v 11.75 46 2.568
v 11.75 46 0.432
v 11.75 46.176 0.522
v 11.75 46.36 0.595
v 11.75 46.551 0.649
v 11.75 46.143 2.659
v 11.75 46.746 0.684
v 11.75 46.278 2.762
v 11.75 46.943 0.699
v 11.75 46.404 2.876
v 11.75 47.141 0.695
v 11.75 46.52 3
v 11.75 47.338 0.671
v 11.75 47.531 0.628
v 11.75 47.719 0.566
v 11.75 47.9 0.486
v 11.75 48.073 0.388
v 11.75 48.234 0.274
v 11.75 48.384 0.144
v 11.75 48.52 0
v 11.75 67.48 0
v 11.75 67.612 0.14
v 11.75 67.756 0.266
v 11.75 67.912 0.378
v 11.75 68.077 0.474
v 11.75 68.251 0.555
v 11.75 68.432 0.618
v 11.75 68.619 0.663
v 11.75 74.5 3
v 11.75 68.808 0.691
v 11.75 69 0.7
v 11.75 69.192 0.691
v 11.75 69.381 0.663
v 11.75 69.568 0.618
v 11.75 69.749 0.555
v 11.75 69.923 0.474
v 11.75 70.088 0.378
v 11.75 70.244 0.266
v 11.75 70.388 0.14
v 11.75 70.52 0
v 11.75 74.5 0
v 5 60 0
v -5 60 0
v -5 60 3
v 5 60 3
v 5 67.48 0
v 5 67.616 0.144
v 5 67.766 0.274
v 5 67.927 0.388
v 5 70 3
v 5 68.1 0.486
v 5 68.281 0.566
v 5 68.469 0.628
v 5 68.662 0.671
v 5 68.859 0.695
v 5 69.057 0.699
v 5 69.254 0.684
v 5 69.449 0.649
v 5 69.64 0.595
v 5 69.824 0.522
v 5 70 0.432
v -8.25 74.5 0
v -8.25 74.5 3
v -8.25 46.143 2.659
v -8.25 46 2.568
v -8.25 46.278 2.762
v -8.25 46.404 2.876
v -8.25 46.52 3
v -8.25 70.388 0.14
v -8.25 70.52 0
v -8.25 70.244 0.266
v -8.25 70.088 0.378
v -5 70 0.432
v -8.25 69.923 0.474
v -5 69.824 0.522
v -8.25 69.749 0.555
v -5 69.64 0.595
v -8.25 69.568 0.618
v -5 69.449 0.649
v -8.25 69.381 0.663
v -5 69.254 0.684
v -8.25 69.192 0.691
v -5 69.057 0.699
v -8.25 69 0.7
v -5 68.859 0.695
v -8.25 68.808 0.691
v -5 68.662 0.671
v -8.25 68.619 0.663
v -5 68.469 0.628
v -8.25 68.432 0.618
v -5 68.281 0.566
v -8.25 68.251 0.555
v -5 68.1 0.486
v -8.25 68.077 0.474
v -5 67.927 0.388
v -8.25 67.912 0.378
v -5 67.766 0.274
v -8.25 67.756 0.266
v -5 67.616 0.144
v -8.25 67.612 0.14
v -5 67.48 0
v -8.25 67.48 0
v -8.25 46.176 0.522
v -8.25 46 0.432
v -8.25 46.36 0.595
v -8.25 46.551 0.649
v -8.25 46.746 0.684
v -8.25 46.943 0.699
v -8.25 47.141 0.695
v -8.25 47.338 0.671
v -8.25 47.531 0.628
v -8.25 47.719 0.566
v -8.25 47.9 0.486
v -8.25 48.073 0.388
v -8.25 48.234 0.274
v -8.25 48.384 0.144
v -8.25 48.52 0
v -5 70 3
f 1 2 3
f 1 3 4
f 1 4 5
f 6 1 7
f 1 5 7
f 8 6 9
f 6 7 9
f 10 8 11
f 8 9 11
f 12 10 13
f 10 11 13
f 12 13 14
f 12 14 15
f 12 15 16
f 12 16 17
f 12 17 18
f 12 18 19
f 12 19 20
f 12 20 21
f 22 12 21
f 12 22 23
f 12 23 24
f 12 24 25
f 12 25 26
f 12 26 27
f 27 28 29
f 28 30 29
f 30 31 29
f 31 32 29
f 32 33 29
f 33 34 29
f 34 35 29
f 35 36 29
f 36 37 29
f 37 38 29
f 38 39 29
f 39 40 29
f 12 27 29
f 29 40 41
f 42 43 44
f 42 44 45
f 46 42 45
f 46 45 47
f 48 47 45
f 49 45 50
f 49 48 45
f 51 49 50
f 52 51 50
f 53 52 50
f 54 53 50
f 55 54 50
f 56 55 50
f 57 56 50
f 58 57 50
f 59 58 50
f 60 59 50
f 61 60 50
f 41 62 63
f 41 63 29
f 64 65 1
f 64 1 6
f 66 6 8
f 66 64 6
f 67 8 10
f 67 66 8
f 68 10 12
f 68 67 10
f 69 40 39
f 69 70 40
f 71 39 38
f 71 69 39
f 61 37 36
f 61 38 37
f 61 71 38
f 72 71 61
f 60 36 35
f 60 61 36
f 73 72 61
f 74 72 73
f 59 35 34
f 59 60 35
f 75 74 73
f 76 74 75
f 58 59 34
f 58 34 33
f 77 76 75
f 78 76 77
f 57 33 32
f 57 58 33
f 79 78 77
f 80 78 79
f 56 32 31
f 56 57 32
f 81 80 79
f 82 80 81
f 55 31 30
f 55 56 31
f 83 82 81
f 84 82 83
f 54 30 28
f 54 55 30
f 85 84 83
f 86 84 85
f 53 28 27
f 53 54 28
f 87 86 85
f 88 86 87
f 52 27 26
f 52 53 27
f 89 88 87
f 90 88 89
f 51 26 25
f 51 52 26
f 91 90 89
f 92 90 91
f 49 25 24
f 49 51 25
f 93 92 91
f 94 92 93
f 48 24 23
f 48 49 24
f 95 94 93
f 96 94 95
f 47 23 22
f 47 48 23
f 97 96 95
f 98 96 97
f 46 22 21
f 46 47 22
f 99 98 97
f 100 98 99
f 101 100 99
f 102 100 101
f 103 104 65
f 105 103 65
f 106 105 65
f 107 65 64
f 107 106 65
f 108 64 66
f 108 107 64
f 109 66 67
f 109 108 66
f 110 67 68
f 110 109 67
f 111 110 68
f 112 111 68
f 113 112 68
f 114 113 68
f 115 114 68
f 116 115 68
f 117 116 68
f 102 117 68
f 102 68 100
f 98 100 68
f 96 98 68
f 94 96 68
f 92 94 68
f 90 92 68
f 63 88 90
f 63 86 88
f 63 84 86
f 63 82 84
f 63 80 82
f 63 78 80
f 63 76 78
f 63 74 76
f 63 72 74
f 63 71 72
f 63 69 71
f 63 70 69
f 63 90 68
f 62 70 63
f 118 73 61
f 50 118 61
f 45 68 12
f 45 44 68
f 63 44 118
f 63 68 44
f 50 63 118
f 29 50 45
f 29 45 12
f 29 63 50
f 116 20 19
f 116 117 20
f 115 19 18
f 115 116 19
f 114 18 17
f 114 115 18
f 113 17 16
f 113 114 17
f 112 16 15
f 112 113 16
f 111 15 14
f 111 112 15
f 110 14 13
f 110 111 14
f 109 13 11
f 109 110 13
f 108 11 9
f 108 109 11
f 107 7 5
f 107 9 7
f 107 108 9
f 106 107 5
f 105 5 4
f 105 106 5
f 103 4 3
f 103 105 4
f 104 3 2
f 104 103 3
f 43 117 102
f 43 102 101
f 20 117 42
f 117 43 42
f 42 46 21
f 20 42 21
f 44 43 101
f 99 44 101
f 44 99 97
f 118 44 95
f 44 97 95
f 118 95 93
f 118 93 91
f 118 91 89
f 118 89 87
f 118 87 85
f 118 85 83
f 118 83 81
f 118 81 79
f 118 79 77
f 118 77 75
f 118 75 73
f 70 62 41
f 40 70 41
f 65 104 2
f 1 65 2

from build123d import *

# Parameters (mm, degrees)
BOX044_W          = 50
BOX044_H          = 20
BOX044_DEPTH      = 30
BOX_W             = 10
BOX_H             = 10
BOX_DEPTH         = 30
CYLINDER011_R     = 2
CYLINDER011_DEPTH = 24
CYLINDER009_R     = 2
CYLINDER009_DEPTH = 24
CYLINDER008_R     = 2
CYLINDER008_DEPTH = 24
BOX001_W          = 20
BOX001_H          = 33
BOX001_DEPTH      = 3


with BuildPart() as cube040:
    # Box044 → Box044 (new body)
    with BuildSketch(Plane(origin=(-25, -32, -1), x_dir=(1, 0, 0), z_dir=(0, 0, 1))):
        with Locations((25, 10)):
            Rectangle(BOX044_W, BOX044_H)
    extrude(amount=BOX044_DEPTH)


with BuildPart() as cube:
    # Box → Box (new body)
    with BuildSketch(Plane(origin=(-5, 2, -1), x_dir=(1, 0, 0), z_dir=(0, 0, 1))):
        with Locations((5, 5)):
            Rectangle(BOX_W, BOX_H)
    extrude(amount=BOX_DEPTH)


with BuildPart() as cylinder007:
    # Cylinder011 → Cylinder011 (new body)
    with BuildSketch(Plane(origin=(-10, -13, 4.3), x_dir=(0, 0, -1), z_dir=(1, 0, 0))):
        Circle(CYLINDER011_R)
    extrude(amount=CYLINDER011_DEPTH)


with BuildPart() as cylinder005:
    # Cylinder009 → Cylinder009 (new body)
    with BuildSketch(Plane(origin=(-10, -11, -1.3), x_dir=(0, 0, -1), z_dir=(1, 0, 0))):
        Circle(CYLINDER009_R)
    extrude(amount=CYLINDER009_DEPTH)


with BuildPart() as cylinder004:
    # Cylinder008 → Cylinder008 (new body)
    with BuildSketch(Plane(origin=(-10, 11, -1.3), x_dir=(0, 0, -1), z_dir=(1, 0, 0))):
        Circle(CYLINDER008_R)
    extrude(amount=CYLINDER008_DEPTH)


with BuildPart() as paste_extruder_charger:
    # Box001 → Box001 (new body)
    with BuildSketch(Plane(origin=(-8.25, -16.5, 0), x_dir=(1, 0, 0), z_dir=(0, 0, 1))):
        with Locations((10, 16.5)):
            Rectangle(BOX001_W, BOX001_H)
    extrude(amount=BOX001_DEPTH)

    # Cut001: cut Cylinder004
    add(cylinder004.part, mode=Mode.SUBTRACT)

    # Cut002: cut Cylinder005
    add(cylinder005.part, mode=Mode.SUBTRACT)

    # Cut003: cut Cylinder007
    add(cylinder007.part, mode=Mode.SUBTRACT)

    # Cut063: cut Cube
    add(cube.part, mode=Mode.SUBTRACT)

    # Cut062: cut Cube040
    add(cube040.part, mode=Mode.SUBTRACT)


with BuildPart() as paste_extruder_charger_1:
    # Cut062 placement: moved
    add(paste_extruder_charger.part.moved(Location((0, 58, 0))))


solid = paste_extruder_charger_1.part
